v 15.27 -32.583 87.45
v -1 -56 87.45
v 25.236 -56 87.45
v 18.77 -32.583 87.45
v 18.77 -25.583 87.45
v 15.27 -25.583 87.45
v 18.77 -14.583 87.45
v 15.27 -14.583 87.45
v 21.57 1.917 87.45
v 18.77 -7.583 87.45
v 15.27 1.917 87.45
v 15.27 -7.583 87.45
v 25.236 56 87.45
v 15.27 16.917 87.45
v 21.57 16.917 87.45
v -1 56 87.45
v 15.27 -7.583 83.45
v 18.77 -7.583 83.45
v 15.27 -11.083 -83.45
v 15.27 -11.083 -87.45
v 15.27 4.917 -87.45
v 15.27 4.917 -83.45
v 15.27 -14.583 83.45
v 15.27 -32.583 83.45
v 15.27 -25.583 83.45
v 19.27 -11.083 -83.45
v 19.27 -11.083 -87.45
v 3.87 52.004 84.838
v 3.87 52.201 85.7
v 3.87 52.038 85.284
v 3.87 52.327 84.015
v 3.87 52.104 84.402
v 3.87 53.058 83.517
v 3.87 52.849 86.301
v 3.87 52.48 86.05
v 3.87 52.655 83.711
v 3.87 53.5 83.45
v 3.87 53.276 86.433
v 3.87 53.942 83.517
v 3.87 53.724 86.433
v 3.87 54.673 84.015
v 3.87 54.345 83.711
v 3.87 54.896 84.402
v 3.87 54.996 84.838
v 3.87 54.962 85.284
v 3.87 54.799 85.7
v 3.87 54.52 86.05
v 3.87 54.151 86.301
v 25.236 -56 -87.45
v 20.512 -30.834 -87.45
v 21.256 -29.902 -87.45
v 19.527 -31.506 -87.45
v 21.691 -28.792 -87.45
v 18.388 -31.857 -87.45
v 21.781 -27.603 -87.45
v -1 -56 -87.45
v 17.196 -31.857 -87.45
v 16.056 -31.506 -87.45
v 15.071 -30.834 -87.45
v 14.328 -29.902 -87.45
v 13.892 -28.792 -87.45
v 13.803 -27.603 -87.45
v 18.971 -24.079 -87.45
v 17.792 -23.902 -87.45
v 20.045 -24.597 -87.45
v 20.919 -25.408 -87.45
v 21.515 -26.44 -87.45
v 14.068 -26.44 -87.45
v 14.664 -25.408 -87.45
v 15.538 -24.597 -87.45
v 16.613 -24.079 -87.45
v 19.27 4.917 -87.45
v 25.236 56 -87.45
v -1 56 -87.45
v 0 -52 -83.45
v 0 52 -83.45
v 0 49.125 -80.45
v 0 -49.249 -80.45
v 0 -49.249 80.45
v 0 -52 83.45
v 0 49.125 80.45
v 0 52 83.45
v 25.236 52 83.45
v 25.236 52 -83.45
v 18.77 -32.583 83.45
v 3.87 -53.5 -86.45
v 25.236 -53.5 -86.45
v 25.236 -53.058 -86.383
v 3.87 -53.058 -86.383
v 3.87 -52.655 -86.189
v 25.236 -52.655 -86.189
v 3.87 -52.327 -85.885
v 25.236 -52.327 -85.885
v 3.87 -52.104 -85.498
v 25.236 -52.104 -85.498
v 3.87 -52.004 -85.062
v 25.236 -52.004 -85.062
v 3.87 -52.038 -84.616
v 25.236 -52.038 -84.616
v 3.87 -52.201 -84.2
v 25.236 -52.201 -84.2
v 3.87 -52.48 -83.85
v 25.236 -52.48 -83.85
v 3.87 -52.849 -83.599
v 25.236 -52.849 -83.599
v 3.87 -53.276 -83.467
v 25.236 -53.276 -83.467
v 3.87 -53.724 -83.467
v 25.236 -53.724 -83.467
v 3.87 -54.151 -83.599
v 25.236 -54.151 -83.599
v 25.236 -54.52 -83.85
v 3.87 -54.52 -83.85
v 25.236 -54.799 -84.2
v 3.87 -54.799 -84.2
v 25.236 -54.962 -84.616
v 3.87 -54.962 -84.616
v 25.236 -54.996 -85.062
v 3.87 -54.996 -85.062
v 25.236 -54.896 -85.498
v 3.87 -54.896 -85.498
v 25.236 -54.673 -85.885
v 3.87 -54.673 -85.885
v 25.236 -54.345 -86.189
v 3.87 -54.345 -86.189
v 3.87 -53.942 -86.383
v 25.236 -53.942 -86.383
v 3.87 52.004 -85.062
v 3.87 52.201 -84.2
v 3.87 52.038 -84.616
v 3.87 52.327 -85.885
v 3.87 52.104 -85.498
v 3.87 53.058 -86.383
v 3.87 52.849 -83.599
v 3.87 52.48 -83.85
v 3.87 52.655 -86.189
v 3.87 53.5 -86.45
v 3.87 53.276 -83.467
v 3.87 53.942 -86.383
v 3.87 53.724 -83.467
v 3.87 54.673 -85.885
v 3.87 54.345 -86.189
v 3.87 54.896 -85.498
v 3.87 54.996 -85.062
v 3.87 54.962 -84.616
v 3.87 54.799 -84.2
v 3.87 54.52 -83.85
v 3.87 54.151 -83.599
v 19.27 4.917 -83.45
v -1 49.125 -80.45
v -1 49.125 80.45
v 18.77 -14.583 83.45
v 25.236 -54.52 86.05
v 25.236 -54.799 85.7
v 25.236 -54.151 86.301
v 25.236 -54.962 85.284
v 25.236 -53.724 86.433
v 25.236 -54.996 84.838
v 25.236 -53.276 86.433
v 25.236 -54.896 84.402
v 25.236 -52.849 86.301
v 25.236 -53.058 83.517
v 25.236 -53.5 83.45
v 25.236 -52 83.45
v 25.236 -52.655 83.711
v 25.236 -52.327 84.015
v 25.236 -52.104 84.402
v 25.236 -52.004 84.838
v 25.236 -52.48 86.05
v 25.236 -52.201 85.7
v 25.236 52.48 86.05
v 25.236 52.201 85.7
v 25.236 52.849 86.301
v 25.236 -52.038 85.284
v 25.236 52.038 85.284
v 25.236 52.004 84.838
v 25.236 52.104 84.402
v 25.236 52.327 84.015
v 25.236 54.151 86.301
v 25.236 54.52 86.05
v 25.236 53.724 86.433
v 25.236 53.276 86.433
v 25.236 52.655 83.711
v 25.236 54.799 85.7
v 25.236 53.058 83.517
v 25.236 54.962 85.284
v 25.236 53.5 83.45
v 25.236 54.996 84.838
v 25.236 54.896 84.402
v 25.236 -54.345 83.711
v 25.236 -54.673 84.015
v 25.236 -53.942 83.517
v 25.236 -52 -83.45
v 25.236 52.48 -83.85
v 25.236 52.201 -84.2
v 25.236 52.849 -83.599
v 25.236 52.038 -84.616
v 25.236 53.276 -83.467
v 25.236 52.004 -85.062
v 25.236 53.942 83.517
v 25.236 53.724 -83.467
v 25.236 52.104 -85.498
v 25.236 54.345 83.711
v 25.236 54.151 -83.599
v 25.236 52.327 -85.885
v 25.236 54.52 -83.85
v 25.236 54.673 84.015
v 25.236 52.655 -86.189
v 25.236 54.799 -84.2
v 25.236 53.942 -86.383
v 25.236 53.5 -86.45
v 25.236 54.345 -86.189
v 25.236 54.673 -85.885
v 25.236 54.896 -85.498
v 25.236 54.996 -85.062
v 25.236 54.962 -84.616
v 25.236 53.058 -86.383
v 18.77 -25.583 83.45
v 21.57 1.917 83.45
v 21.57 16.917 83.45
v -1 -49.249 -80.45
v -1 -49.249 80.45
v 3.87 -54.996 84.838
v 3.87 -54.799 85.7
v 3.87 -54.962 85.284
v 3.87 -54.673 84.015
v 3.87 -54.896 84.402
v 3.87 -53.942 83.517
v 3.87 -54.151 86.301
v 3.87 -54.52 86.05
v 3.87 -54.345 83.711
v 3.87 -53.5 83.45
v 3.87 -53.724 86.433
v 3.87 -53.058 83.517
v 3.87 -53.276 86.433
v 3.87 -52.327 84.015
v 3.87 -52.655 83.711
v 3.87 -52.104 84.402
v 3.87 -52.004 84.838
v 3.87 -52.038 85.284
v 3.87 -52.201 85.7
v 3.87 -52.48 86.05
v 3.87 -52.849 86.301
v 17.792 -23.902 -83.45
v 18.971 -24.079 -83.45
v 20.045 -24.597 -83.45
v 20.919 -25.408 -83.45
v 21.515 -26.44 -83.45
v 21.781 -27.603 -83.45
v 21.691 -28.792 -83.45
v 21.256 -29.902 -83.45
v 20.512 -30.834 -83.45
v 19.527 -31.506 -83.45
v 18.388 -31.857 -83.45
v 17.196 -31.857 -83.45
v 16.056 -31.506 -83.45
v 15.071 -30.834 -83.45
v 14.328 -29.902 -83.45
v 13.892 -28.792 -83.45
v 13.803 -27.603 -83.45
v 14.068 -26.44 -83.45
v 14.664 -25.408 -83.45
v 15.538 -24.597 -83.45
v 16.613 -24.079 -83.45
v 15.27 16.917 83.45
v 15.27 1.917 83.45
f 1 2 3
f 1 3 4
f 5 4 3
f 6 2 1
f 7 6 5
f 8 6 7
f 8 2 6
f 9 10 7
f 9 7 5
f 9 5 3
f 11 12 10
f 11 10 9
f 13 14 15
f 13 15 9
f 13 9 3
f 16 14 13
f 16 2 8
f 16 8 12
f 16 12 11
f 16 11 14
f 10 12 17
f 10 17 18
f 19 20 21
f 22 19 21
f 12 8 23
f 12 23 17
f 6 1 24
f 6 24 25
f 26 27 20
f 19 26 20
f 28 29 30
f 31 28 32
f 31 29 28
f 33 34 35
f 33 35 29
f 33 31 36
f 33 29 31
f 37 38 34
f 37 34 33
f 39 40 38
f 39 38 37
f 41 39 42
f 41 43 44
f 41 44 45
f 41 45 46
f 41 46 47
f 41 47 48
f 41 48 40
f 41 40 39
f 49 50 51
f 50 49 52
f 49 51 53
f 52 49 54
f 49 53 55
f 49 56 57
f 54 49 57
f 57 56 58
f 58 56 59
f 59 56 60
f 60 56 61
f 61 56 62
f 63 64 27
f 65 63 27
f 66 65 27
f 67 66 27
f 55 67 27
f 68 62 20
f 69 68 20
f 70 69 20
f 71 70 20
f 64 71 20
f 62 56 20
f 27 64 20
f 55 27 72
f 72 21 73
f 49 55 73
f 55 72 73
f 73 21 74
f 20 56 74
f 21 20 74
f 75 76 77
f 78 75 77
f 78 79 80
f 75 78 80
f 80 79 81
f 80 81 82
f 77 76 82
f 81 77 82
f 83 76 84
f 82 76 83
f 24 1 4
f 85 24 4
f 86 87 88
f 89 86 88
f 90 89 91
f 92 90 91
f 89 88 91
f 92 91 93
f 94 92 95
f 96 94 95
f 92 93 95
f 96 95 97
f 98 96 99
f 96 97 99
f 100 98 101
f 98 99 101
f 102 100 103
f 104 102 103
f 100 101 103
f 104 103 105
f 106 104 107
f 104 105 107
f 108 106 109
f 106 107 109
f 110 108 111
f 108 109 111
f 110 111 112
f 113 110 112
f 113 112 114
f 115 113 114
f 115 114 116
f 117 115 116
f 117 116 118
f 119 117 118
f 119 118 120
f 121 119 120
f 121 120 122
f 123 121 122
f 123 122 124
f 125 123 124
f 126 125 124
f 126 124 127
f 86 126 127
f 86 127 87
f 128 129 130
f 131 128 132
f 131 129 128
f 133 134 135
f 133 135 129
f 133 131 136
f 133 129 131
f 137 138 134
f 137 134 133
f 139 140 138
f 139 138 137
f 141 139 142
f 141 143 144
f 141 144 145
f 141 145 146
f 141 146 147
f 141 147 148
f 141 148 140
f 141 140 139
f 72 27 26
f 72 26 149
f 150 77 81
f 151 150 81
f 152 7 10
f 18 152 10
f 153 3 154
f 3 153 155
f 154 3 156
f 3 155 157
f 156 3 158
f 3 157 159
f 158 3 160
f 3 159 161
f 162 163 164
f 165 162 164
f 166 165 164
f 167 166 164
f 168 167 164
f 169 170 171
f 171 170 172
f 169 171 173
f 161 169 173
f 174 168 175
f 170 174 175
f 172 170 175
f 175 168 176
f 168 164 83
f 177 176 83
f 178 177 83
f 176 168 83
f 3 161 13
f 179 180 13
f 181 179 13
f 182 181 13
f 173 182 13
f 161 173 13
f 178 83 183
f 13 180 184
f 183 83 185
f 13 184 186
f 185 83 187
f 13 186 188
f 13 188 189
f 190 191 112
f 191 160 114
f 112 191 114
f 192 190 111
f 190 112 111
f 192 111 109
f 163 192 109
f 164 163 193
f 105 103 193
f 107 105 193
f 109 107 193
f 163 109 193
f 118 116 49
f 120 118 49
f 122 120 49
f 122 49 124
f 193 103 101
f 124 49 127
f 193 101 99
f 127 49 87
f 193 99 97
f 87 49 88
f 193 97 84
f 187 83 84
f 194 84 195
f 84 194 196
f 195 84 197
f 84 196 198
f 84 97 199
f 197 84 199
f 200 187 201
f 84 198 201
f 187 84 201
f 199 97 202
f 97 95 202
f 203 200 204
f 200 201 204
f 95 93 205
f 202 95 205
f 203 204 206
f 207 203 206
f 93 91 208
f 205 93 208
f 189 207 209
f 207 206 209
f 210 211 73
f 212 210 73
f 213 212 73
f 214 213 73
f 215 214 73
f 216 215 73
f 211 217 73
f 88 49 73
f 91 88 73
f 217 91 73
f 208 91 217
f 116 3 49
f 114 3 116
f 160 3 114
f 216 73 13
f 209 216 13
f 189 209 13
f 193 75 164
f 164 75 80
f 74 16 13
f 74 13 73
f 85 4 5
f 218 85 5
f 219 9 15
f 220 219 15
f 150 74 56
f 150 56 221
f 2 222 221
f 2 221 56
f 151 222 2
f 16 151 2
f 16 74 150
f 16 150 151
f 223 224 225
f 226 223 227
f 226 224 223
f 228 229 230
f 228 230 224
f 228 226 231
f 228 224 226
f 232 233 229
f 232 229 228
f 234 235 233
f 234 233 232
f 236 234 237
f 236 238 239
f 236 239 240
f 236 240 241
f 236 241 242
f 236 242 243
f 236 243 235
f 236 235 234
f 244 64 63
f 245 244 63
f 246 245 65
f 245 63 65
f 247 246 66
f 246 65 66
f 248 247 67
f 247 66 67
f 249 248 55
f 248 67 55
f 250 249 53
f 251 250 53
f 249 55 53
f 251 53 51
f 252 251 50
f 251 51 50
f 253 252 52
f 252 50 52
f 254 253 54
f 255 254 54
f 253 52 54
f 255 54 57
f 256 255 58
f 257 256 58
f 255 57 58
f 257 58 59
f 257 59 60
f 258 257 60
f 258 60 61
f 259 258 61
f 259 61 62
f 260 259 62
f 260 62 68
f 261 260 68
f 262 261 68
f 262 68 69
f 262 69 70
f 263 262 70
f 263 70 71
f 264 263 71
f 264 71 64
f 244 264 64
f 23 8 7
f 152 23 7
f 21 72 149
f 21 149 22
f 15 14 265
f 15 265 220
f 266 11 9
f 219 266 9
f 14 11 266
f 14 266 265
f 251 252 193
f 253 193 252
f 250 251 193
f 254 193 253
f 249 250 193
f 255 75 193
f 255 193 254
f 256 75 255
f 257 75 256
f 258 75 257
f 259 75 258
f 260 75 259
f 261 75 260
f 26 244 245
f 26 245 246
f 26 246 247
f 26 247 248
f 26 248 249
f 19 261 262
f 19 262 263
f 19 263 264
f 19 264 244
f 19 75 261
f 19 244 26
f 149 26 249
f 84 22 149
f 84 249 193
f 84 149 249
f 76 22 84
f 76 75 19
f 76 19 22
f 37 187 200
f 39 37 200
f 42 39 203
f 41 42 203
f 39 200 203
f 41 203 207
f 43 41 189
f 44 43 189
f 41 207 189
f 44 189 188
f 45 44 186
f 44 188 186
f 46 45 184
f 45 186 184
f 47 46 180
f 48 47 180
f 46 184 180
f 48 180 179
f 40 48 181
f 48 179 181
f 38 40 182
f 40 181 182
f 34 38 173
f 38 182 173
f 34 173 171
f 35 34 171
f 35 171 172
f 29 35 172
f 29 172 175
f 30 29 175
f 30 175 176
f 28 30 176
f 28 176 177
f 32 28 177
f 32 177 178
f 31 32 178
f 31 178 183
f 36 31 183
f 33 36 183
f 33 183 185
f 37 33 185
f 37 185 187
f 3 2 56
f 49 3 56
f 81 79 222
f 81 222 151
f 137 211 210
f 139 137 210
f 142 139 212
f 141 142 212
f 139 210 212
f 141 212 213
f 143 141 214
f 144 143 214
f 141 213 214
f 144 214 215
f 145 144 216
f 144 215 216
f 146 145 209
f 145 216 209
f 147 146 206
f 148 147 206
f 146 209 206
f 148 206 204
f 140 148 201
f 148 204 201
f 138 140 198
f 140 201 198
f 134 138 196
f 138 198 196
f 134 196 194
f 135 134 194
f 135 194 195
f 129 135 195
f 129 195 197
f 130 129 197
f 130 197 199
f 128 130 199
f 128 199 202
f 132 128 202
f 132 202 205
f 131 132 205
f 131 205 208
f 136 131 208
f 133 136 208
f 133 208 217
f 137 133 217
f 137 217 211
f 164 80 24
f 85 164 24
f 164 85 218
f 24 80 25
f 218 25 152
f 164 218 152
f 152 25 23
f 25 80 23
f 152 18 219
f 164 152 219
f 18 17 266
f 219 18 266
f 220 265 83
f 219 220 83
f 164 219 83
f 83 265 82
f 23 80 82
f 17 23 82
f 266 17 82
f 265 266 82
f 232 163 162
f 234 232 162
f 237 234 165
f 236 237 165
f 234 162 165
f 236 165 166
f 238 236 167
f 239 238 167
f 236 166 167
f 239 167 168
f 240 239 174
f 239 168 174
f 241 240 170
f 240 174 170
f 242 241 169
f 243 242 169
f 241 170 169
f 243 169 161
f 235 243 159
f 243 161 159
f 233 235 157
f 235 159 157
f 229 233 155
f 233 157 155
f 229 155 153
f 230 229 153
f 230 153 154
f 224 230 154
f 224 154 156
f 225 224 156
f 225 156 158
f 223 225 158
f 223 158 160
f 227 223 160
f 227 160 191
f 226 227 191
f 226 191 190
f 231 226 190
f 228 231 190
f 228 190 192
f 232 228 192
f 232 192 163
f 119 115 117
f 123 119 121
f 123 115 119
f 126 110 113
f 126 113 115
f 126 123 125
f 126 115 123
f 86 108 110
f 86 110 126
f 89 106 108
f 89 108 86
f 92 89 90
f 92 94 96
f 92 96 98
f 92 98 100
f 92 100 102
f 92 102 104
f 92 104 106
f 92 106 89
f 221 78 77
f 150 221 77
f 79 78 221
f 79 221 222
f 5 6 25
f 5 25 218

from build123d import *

# Parameters (mm, degrees)
CROQUIS1_W              = 164.9
CROQUIS1_H              = 102
SALIENTE_EXTRUIR2_DEPTH = 14.27
CROQUIS2_W              = 174.9
CROQUIS2_H              = 112
CROQUIS2_W_2            = 166.9
CROQUIS2_H_2            = 104
SALIENTE_EXTRUIR3_DEPTH = 14.27
CROQUIS3_W              = 174.9
CROQUIS3_H              = 112
CROQUIS3_W_2            = 160.9
CROQUIS3_H_2            = 98.374406292
SALIENTE_EXTRUIR5_DEPTH = 1
CROQUIS4_W              = 164.9
CROQUIS4_H              = 102
CORTAR_EXTRUIR2_DEPTH   = 14.27
CROQUIS6_W              = 174.9
CROQUIS6_H              = 112
CROQUIS6_R              = 1.5
SALIENTE_EXTRUIR6_DEPTH = 15
CROQUIS8_W              = 160.9
CROQUIS8_H              = 98.374406292
CORTAR_EXTRUIR3_DEPTH   = 9
CROQUIS9_W              = 166.9
CROQUIS9_H              = 104
CORTAR_EXTRUIR5_DEPTH   = 11
CROQUIS15_W             = 6.3
CROQUIS15_H             = 15
CROQUIS15_W_2           = 3.5
CROQUIS15_H_2           = 7
CORTAR_EXTRUIR6_DEPTH   = 7
CORTAR_EXTRUIR7_DEPTH   = 7
CROQUIS17_R             = 4
CORTAR_EXTRUIR8_DEPTH   = 7
CROQUIS18_W             = 4
CROQUIS18_H             = 16
CORTAR_EXTRUIR9_DEPTH   = 7
CROQUIS21_R             = 1.5
CORTAR_EXTRUIR12_DEPTH  = 25.4
CROQUIS22_W             = 4.034105038
CROQUIS22_H             = 112
CORTAR_EXTRUIR13_DEPTH  = 179.4


with BuildPart() as part:
    # Croquis1 → Saliente-Extruir2 (new body)
    with BuildSketch(Plane(origin=(0, 0, 0), x_dir=(0, 0, -1), z_dir=(1, 0, 0))):
        Rectangle(CROQUIS1_W, CROQUIS1_H)
    extrude(amount=SALIENTE_EXTRUIR2_DEPTH)

    # Croquis4 → Cortar-Extruir2 (cut)
    with BuildSketch(Plane(origin=(14.27, 0, 0), x_dir=(0, 0, -1), z_dir=(1, 0, 0))):
        Rectangle(CROQUIS4_W, CROQUIS4_H)
    extrude(amount=-CORTAR_EXTRUIR2_DEPTH, mode=Mode.SUBTRACT)


with BuildPart() as body_2:
    # Croquis2 → Saliente-Extruir3 (new body)
    with BuildSketch(Plane(origin=(0, 0, 0), x_dir=(0, 0, -1), z_dir=(1, 0, 0))):
        Rectangle(CROQUIS2_W, CROQUIS2_H)
        Rectangle(CROQUIS2_W_2, CROQUIS2_H_2, mode=Mode.SUBTRACT)
    extrude(amount=SALIENTE_EXTRUIR3_DEPTH)

    # Croquis3 → Saliente-Extruir5 (add)
    with BuildSketch(Plane.ZY):
        Rectangle(CROQUIS3_W, CROQUIS3_H)
        with Locations((0, -0.062203146)):
            Rectangle(CROQUIS3_W_2, CROQUIS3_H_2, mode=Mode.SUBTRACT)
    extrude(amount=SALIENTE_EXTRUIR5_DEPTH)

    # Croquis6 → Saliente-Extruir6 (add)
    with BuildSketch(Plane(origin=(14.27, 0, 0), x_dir=(0, 0, -1), z_dir=(1, 0, 0))):
        Rectangle(CROQUIS6_W, CROQUIS6_H)
        with Locations((-77.445, 46)):
            Circle(CROQUIS6_R, mode=Mode.SUBTRACT)
        with Locations((-77.445, -46)):
            Circle(CROQUIS6_R, mode=Mode.SUBTRACT)
        with Locations((-22.1, 15.81)):
            Circle(CROQUIS6_R, mode=Mode.SUBTRACT)
        with Locations((35.9, 15.81)):
            Circle(CROQUIS6_R, mode=Mode.SUBTRACT)
        with Locations((-22.1, -33.19)):
            Circle(CROQUIS6_R, mode=Mode.SUBTRACT)
        with Locations((35.9, -33.19)):
            Circle(CROQUIS6_R, mode=Mode.SUBTRACT)
        with Locations((77.445, 46)):
            Circle(CROQUIS6_R, mode=Mode.SUBTRACT)
        with Locations((77.445, -46)):
            Circle(CROQUIS6_R, mode=Mode.SUBTRACT)
    extrude(amount=SALIENTE_EXTRUIR6_DEPTH)

    # Croquis8 → Cortar-Extruir3 (cut)
    with BuildSketch(Plane.ZY.offset(-14.27)):
        with Locations((0, -0.062203146)):
            Rectangle(CROQUIS8_W, CROQUIS8_H)
    extrude(amount=-CORTAR_EXTRUIR3_DEPTH, mode=Mode.SUBTRACT)

    # Croquis9 → Cortar-Extruir5 (cut)
    with BuildSketch(Plane.ZY.offset(-14.27)):
        Rectangle(CROQUIS9_W, CROQUIS9_H)
    extrude(amount=-CORTAR_EXTRUIR5_DEPTH, mode=Mode.SUBTRACT)

    # Croquis15 → Cortar-Extruir6 (cut)
    with BuildSketch(Plane.XY.offset(87.45)):
        with Locations((18.42, 9.417324545)):
            Rectangle(CROQUIS15_W, CROQUIS15_H)
        with Locations((17.02, -11.082675455)):
            Rectangle(CROQUIS15_W_2, CROQUIS15_H_2)
        with Locations((17.02, -29.082675455)):
            Rectangle(CROQUIS15_W_2, CROQUIS15_H_2)
    extrude(amount=-CORTAR_EXTRUIR6_DEPTH, mode=Mode.SUBTRACT)

    # Croquis16 → Cortar-Extruir7 (cut)
    with BuildSketch(Plane(origin=(29.27, 0, 0), x_dir=(0, 0, -1), z_dir=(1, 0, 0))):
        with BuildLine():
            Line((-70.67585332, 19.450942007), (-40.125245351, 19.450942007))
            ThreePointArc((-40.125245351, 19.450942007), (-36.589711445, 20.915408101), (-35.125245351, 24.450942007))
            Line((-35.125245351, 24.450942007), (-35.125245351, 43.370497663))
            ThreePointArc((-35.125245351, 43.370497663), (-36.589711445, 46.906031569), (-40.125245351, 48.370497663))
            Line((-40.125245351, 48.370497663), (-70.67585332, 48.370497663))
            ThreePointArc((-70.67585332, 48.370497663), (-74.211387226, 46.906031569), (-75.67585332, 43.370497663))
            Line((-75.67585332, 43.370497663), (-75.67585332, 24.450942007))
            ThreePointArc((-75.67585332, 24.450942007), (-74.211387226, 20.915408101), (-70.67585332, 19.450942007))
        make_face()
        with BuildLine():
            Line((40.269537366, 19.465768949), (70.820145334, 19.465768949))
            ThreePointArc((70.820145334, 19.465768949), (74.35567924, 20.930235043), (75.820145334, 24.465768949))
            Line((75.820145334, 24.465768949), (75.820145334, 43.385324606))
            ThreePointArc((75.820145334, 43.385324606), (74.35567924, 46.920858512), (70.820145334, 48.385324606))
            Line((70.820145334, 48.385324606), (40.269537366, 48.385324606))
            ThreePointArc((40.269537366, 48.385324606), (36.73400346, 46.920858512), (35.269537366, 43.385324606))
            Line((35.269537366, 43.385324606), (35.269537366, 24.465768949))
            ThreePointArc((35.269537366, 24.465768949), (36.73400346, 20.930235043), (40.269537366, 19.465768949))
        make_face()
    extrude(amount=-CORTAR_EXTRUIR7_DEPTH, mode=Mode.SUBTRACT)

    # Croquis17 → Cortar-Extruir8 (cut)
    with BuildSketch(Plane(origin=(0, 0, -87.45), x_dir=(-1, 0, 0), z_dir=(0, 0, -1))):
        with Locations(Location((-17.79171335, -27.901665979, 0), (0, 0, 90))):
            Circle(CROQUIS17_R)
    extrude(amount=-CORTAR_EXTRUIR8_DEPTH, mode=Mode.SUBTRACT)

    # Croquis18 → Cortar-Extruir9 (cut)
    with BuildSketch(Plane(origin=(0, 0, -87.45), x_dir=(-1, 0, 0), z_dir=(0, 0, -1))):
        with Locations((-17.27, -3.082675455)):
            Rectangle(CROQUIS18_W, CROQUIS18_H)
    extrude(amount=-CORTAR_EXTRUIR9_DEPTH, mode=Mode.SUBTRACT)

    # Croquis21 → Cortar-Extruir12 (cut)
    with BuildSketch(Plane(origin=(29.27, 0, 0), x_dir=(0, 0, -1), z_dir=(1, 0, 0))):
        with Locations((-84.95, 53.5)):
            Circle(CROQUIS21_R)
        with Locations((84.95, 53.5)):
            Circle(CROQUIS21_R)
        with Locations((84.95, -53.5)):
            Circle(CROQUIS21_R)
        with Locations((-84.95, -53.5)):
            Circle(CROQUIS21_R)
    extrude(amount=-CORTAR_EXTRUIR12_DEPTH, mode=Mode.SUBTRACT)

    # Croquis22 → Cortar-Extruir13 (cut)
    with BuildSketch(Plane(origin=(0, 0, -87.45), x_dir=(-1, 0, 0), z_dir=(0, 0, -1))):
        with Locations((-27.252947481, 0)):
            Rectangle(CROQUIS22_W, CROQUIS22_H)
    extrude(amount=-CORTAR_EXTRUIR13_DEPTH, mode=Mode.SUBTRACT)


solid = body_2.part
